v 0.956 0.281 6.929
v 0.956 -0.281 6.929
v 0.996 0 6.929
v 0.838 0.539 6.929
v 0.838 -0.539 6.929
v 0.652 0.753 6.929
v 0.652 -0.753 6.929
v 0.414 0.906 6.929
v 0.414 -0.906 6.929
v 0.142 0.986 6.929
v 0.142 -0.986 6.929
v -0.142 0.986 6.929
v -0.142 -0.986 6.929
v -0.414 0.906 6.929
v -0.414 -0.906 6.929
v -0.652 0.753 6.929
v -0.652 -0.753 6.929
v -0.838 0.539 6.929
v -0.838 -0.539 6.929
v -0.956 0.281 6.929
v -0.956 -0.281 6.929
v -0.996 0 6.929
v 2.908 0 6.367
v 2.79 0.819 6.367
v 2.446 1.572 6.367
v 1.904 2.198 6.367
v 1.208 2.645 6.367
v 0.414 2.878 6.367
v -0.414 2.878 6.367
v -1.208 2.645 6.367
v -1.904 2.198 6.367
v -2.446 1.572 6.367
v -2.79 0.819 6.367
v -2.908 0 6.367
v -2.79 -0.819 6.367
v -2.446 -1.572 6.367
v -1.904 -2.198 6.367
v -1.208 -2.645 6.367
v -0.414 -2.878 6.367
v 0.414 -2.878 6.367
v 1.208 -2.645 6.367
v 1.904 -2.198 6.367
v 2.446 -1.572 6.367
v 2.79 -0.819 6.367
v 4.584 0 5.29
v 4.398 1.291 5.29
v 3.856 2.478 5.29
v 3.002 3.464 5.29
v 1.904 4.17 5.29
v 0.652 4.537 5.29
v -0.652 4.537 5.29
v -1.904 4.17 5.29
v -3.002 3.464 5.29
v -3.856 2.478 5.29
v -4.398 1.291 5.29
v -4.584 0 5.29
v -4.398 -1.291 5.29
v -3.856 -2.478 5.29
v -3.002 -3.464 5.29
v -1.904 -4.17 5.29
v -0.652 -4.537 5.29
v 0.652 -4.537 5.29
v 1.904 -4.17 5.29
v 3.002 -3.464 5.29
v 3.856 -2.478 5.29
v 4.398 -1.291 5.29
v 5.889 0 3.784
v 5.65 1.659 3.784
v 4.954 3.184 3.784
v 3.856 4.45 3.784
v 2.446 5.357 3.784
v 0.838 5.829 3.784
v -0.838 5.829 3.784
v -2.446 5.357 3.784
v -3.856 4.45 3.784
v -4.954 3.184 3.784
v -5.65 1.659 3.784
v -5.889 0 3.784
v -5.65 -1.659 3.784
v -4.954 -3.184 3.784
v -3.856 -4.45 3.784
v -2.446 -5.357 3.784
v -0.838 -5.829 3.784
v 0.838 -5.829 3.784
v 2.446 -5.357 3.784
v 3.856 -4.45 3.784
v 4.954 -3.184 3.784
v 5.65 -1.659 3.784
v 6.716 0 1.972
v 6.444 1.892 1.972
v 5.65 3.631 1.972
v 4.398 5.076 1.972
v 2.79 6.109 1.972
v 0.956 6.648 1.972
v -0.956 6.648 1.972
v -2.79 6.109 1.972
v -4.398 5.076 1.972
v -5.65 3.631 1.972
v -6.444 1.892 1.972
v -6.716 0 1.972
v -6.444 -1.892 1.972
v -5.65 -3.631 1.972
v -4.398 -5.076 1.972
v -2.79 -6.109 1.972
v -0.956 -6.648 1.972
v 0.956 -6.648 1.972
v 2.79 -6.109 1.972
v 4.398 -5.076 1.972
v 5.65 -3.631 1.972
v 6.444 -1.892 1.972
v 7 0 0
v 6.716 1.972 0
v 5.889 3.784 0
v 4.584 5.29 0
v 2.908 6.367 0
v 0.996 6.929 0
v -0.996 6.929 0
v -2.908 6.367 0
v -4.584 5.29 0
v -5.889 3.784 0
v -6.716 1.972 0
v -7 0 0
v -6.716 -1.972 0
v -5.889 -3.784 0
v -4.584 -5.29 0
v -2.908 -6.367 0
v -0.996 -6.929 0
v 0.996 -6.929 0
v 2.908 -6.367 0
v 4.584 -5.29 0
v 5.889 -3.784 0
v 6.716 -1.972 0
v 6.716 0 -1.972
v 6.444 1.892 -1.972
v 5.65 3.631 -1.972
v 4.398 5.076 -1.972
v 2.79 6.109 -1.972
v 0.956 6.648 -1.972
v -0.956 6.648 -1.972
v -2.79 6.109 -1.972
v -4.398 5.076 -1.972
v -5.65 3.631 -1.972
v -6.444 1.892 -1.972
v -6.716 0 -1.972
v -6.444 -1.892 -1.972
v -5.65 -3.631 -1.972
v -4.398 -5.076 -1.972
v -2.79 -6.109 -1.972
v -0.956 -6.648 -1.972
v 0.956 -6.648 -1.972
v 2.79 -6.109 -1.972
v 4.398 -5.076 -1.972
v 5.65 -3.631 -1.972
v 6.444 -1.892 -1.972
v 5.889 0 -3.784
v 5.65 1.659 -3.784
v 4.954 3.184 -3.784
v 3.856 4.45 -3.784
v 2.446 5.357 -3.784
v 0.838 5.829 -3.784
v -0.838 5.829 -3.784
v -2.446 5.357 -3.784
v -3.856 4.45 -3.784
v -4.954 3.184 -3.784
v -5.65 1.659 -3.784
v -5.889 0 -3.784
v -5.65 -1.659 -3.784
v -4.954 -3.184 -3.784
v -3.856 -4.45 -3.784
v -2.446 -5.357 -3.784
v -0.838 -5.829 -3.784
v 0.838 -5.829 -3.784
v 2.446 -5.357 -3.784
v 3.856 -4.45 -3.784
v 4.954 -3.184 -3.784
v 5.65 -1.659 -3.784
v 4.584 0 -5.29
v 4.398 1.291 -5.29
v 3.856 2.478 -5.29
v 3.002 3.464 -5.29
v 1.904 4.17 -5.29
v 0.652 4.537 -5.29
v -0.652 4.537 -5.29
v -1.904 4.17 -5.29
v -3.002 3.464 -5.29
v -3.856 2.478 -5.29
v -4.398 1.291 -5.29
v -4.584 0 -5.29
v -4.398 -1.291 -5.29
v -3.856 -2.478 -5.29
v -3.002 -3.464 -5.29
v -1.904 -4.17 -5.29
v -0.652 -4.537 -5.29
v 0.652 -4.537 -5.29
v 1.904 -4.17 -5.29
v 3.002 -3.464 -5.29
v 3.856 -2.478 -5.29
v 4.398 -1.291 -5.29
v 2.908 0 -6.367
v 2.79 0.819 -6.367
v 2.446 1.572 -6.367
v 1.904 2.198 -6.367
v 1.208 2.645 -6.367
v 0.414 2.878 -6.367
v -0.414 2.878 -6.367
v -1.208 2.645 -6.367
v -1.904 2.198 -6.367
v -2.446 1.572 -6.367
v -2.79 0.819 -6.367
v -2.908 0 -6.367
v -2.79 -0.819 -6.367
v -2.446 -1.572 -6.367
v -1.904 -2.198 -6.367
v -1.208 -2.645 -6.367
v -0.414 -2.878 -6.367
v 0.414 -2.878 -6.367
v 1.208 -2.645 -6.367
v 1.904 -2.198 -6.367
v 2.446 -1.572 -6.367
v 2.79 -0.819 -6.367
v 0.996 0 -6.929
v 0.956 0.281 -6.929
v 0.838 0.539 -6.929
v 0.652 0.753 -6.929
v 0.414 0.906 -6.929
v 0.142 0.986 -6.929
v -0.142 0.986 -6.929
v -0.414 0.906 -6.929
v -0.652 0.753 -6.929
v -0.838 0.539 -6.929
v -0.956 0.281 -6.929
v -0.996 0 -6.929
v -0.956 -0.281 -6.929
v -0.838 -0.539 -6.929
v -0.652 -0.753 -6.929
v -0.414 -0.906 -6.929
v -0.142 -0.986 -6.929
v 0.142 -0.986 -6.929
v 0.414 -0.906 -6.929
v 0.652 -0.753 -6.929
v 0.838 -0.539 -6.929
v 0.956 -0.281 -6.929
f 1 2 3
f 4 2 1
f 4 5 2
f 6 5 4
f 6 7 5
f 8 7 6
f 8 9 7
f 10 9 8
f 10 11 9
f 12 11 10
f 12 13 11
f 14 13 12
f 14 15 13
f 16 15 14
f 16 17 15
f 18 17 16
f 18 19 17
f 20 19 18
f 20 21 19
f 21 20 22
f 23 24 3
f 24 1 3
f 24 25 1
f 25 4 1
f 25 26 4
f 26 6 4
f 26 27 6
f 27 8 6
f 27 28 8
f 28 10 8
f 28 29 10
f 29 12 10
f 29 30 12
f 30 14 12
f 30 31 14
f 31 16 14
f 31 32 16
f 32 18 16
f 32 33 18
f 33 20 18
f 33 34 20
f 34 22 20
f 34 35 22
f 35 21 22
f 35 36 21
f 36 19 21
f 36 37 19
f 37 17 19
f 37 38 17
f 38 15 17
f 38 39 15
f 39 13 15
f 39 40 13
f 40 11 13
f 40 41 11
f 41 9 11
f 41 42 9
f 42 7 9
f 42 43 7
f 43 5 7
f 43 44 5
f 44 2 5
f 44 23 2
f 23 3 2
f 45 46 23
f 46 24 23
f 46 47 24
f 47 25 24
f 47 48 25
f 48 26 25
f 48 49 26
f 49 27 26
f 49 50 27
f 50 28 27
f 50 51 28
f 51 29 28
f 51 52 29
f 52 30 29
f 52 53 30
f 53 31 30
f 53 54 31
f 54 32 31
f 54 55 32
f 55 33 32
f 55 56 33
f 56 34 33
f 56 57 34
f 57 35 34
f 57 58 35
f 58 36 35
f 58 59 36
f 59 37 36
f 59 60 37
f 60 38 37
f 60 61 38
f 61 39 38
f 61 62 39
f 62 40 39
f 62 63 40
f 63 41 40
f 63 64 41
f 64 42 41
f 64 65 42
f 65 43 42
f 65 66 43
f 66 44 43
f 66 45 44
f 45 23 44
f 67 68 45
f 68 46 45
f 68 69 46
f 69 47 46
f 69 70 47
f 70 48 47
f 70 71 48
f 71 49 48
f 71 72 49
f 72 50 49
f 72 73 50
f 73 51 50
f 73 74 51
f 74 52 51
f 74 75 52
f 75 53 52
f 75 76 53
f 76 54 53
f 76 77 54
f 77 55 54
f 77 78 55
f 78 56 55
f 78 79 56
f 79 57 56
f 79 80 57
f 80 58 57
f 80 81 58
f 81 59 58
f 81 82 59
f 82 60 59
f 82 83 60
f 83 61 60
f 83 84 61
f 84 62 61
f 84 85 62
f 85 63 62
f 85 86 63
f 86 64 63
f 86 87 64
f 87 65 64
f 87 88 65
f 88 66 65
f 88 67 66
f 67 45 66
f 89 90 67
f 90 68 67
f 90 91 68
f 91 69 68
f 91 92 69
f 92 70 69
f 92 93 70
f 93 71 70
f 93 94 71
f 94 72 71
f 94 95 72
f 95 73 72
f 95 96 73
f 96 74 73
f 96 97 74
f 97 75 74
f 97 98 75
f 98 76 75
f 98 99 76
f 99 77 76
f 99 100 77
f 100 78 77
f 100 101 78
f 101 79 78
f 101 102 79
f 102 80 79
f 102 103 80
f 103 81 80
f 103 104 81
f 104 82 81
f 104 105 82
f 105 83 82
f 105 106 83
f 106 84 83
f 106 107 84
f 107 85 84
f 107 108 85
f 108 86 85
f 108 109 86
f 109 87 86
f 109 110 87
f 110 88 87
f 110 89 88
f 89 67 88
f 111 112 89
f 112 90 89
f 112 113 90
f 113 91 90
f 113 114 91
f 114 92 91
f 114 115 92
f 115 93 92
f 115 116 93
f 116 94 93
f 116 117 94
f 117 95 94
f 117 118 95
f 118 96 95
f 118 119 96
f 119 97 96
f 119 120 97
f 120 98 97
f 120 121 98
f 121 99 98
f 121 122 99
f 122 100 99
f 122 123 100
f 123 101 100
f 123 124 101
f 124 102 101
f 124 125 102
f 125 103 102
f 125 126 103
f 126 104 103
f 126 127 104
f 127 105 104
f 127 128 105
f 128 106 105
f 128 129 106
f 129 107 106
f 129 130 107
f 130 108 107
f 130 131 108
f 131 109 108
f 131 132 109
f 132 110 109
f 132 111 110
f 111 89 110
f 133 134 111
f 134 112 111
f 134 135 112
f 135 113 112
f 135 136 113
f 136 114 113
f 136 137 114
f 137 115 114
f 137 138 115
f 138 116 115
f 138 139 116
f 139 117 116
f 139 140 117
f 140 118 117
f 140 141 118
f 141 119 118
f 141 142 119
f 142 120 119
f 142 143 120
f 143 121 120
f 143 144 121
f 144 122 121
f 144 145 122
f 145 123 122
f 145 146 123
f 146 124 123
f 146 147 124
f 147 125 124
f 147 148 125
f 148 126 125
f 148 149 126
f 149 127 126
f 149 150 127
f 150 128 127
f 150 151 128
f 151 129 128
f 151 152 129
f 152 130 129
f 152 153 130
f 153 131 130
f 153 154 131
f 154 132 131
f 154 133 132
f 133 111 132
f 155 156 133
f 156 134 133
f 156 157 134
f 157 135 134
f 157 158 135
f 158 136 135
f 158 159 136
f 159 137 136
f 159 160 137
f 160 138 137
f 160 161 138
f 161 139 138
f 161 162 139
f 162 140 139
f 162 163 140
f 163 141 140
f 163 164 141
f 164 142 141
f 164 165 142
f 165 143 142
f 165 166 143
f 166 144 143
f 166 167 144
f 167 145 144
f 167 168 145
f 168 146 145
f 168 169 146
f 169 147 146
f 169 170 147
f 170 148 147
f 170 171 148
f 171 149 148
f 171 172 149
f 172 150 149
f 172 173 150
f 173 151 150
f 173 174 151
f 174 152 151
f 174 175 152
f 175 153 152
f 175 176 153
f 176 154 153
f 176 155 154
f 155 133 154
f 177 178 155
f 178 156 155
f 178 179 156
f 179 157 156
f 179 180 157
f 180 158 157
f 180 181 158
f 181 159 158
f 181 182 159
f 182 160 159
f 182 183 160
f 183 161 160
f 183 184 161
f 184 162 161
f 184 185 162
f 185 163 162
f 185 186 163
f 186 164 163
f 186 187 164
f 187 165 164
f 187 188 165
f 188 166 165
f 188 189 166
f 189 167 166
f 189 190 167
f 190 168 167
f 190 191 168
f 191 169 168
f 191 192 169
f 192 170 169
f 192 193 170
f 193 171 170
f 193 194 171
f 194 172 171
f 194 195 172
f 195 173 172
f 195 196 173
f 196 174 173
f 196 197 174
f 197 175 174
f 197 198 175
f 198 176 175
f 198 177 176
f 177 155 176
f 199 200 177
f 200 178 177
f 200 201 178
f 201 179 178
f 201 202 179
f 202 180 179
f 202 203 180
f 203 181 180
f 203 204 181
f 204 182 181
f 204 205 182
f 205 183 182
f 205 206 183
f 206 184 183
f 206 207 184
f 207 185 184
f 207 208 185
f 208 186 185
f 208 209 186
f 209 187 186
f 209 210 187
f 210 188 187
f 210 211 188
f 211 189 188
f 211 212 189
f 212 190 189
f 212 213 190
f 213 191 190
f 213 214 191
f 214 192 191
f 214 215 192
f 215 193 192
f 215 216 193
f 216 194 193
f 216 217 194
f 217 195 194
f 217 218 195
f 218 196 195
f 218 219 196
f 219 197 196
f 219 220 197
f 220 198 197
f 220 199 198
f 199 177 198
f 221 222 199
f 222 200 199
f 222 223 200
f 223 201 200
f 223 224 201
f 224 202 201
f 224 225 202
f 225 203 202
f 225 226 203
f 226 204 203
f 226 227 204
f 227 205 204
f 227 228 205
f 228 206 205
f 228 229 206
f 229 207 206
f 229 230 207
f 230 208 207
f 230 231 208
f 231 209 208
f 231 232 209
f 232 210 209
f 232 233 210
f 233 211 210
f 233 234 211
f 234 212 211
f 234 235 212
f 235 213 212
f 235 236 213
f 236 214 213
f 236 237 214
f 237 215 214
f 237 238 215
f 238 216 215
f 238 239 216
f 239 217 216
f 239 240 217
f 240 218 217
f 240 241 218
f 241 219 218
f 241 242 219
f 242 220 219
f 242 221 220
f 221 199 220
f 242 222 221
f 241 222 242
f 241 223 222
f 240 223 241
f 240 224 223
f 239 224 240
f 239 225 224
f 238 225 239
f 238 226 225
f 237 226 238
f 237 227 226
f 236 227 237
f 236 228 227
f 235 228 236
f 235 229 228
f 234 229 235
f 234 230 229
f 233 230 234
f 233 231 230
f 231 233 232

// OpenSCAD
// file: ../src/cadence.scad
// as of 2019.05, OpenSCAD understands
// is_num, is_list, is_string, and, is_bool
//
// is_function is coming, but looks tricky



function _normalize_angle(a) =
  ((a >= 0 && a <= 360) ? a : _normalize_angle(a + (a < 0 ? 360 : -360)));


function _is_point(p) =
  is_list(p) && len(p) == 3 && is_num(p.x) && is_num(p.y) && is_num(p.z);


//
// dictionary functions

function _aaget(dict, key, default, off) =
  let (kv = dict[off])
    kv == undef ? default :
    kv[0] == key ? kv[1] :
      _aaget(dict, key, default, off + 1);

function _asget(dict, key, default, off) =
  dict[off] == undef ? default :
  dict[off] == key ? dict[off + 1] :
    _asget(dict, key, default, off + 2);

function _get(dict, key, default=undef) =
  is_string(dict[0]) ?
    _asget(dict, key, default, 0) :
    _aaget(dict, key, default, 0);

function _del(dict, key) =
  [ for (kv = dict) if (kv[0] != key) kv ];

function _put(dict, key, value) =
  concat(_del(dict, key), [ [ key, value ] ]);


function _assoc(arr, key, default, off=0) =
  let (a = arr[off])
  a == undef ? default :
  a[0] == key ? a :
  _assoc(arr, key, default, off + 1);

function _app(arr, entry) =
  concat(_del(arr, entry[0]), [ entry ]);


//
// list functions

function _idx(list, index, default=undef) =
  let (
    i = index < 0 ? len(list) + index : index,
    r = list[i]
  )
  r == undef ? default : r;

  // sublist
  //
function _slist(list, from=0, to) =
  let(
    li = len(list) - 1,
    end = (to == undef ? li : to),
    a0 = from < 0 ? li + 1 + from : from,
    a = a0 < 0 ? 0 : a0,
    z = end < 0 ? li + 1 + end : end
  )
    a > li ? [] :
    z < a ? [] :
      [ for (i = [a:z]) list[i] ];

function _reverse(list) =
  [ for (i = [ len(list) - 1 : -1 : 0 ]) list[i] ];


//
// string functions

function _sstr(s, from=0, length=undef, r="") =
  let(
    i = from < 0 ? len(s) + from : from,
    l = length == undef ? len(s) : length,
    s0 = s[i]
  )
  (s0 == undef || l < 1) ? r :
  str(r, s[i], _sstr(s, i + 1, l - 1));

function _sindex(s, s1, i=0) =
  let(
    l = len(s1),
    s0 = _sstr(s, i, l)
  )
  len(s0) < l ? undef :
  s0 == s1 ? i :
  _sindex(s, s1, i + 1);


function _ends_with(l, l1)=
  is_string(l) ? (_sstr(l, len(l) - len(l1)) == l1) :
  is_list(l) ? (_slist(l, len(l) - len(l1)) == l1) :
  false;


//
// point functions

  // Accept a single angle instead of [ angle0, angle1 ]
  // 'sp' is the start point
  //
function _to_point(length, angles, sp=[ 0, 0, 0 ]) =
  let(
    as = is_num(angles) ? [ angles, 0 ] : angles,
    inclination = as[0],
    azimuth = as[1] + 90
  )
    sp + [
      length * cos(inclination) * cos(azimuth),
      length * cos(inclination) * sin(azimuth),
      length * sin(inclination) ];

function _to_spherical(point) =
  let(
    l = norm(point),
    ele = asin(point.z / l),
    dir = atan2(point.y, point.x) - 90
  )
    [ l, [ ele, dir ] ];

function _to_spherical_xyz(point) =
  let(
    l = norm(point),
    ele = asin(point.z / l),
    dir = atan2(point.y, point.x) - 90
  )
    [ l, ele, dir ];

function _to_ele_dir(point) =
  let(
    ele = asin(point.z / l),
    dir = atan2(point.y, point.x) - 90
  )
    [ ele, dir ];


function _midpoint(p0, p1, ratio=0.5) =
  let(
    s = _to_spherical(p1 - p0)
  )
    _to_point(ratio * s[0], s[1], p0);

//function _vlen(vector) =
//  sqrt(pow(vector.x, 2) + pow(vector.y, 2) + pow(vector.z, 2));
  //
  // no, use norm(vector)


// inspiration:
// https://climberg.de/post/openscad_bezier_curves_of_any_degrees

function _bezier_choose(n, k) =
  k == 0 ?  1 : (n * _bezier_choose(n - 1, k - 1)) / k;

function _bezier_point(points, t, i, c) =
  len(points) == i ?
    c :
    _bezier_point(
      points,
      t,
      i + 1,
      c +
        _bezier_choose(len(points) - 1, i) *
        pow(t, i) *
        pow(1 - t, len(points) - i - 1) * points[i]);

function _bezier_points(control_points, sample_count) =
  [ for (t = [ 0 : 1.0 / sample_count : 1 ])
    _bezier_point(control_points, t, 0, [ 0, 0, 0 ]) ];


//
// modules

module polypoints(points) {

  for (i = [ 0 : len(points) - 1 ]) {
    translate(points[i]) children(i % $children);
  }
}

module polyhulls(points) {

  for (i = [ 0 : len(points) - 2 ]) {

    hull() {
      translate(points[i]) children(i % $children);
      translate(points[i + 1]) children((i + 1) % $children);
    }
  }
}


// pineapple slice
//
module paslice(radius, depth, slice=45, radius1=0) {

  s = _normalize_angle(slice);
  r = radius;

  if (s > 0) difference() {

    cylinder(depth, r=r);

    translate([ 0, 0, -0.1 ]) cylinder(depth * 1.1, r=radius1);

    if (s != 360) {

      pas = [
        [ 0, r ], [ 0, 0 ] ];
      pbs = [
        [ r, r ], [ r, 0 ], [ r, -r ], [ 0, -r ], [ -r, -r ], [ -r, 0 ],
        [ -r, r ] ];

      t = tan(s);
      tx = t * r;
      ty = r / t;

      translate([ 0, 0, -0.1 ]) linear_extrude(depth + 0.2)
        if (s <= 45)
          polygon(concat(pas, [ [ tx, r ] ], pbs));
        else if (s <= 135)
          polygon(concat(pas, [ [ r, ty ] ], _slist(pbs, 2)));
        else if (s <= 225)
          polygon(concat(pas, [ [ -tx, -r ] ], _slist(pbs, 4)));
        else if (s <= 315)
          polygon(concat(pas, [ [ -r, -ty ] ], _slist(pbs, 6)));
        else if (s < 360)
          polygon(concat(pas, [ [ tx, r ] ]));
    }
  }
}


// dome with optional trunk_height
//
module dome(radius=-1, diameter=-1, trunk_height=0) {

  r = radius < 0 ? diameter / 2 : radius;
  th = trunk_height;

  translate([ 0, 0, th ])
    difference() {
      sphere(r=r);
      translate([ 0, 0, -r ]) cube(2 * r, center=true);
    }
  translate([ 0, 0, th / 2 ])
    cylinder(r=r, h=th, center=true);
}
// main file
//
// test_string.scad
//
// Sat May  1 10:44:36 JST 2021
//

use <../src/cadence.scad>;


//echo(_sstr("abcde"));
//echo(_sstr("abcde", 1));
//echo(_sstr("abcde", 1, 2));
//echo(_sstr("abcde", -4, 2));

assert(_sstr("abcde") == "abcde");
assert(_sstr("abcde", 1) == "bcde");
assert(_sstr("abcde", 1, 2) == "bc");
assert(_sstr("abcde", 1, 100) == "bcde");

assert(_sstr("abcde", -2) == "de");
assert(_sstr("abcde", -4, 3) == "bcd");

// nota bene:
//if(undef) echo("nada0");
//if(true) echo("nada1");
//if(-1) echo("nada2");

//echo(_sindex("height ratio", "ratio"));
assert(_sindex("height ratio", "rad") == undef);
assert(_sindex("height ratio", "ratio") == 7);
assert(_sindex("height rati", "ratio") == undef);


echo(_ends_with("ball diameter", "diameter"));
echo(_ends_with([ 0, 1, 2 ], [ 1, 2 ]));
assert(_ends_with("ball diameter", "dia") == false);
assert(_ends_with("ball diameter", "diameter") == true);
assert(_ends_with("ball diameterZ", "diameter") == false);
assert(_ends_with([ 0, 1, 2 ], [ 1, 2 ]) == true);
assert(_ends_with([ 0, 1, 2 ], [ 0, 2 ]) == false);
assert(_ends_with([ 0, 1, 2, 3 ], [ 1, 2 ]) == false);

assert(_ends_with(undef, [ 0, 2 ]) == false);
assert(_ends_with(1, [ 0, 2 ]) == false);
assert(_ends_with("foo", [ 0, 2 ]) == false);

//
// SUCCESS, green ball!

color("green") sphere(7);
